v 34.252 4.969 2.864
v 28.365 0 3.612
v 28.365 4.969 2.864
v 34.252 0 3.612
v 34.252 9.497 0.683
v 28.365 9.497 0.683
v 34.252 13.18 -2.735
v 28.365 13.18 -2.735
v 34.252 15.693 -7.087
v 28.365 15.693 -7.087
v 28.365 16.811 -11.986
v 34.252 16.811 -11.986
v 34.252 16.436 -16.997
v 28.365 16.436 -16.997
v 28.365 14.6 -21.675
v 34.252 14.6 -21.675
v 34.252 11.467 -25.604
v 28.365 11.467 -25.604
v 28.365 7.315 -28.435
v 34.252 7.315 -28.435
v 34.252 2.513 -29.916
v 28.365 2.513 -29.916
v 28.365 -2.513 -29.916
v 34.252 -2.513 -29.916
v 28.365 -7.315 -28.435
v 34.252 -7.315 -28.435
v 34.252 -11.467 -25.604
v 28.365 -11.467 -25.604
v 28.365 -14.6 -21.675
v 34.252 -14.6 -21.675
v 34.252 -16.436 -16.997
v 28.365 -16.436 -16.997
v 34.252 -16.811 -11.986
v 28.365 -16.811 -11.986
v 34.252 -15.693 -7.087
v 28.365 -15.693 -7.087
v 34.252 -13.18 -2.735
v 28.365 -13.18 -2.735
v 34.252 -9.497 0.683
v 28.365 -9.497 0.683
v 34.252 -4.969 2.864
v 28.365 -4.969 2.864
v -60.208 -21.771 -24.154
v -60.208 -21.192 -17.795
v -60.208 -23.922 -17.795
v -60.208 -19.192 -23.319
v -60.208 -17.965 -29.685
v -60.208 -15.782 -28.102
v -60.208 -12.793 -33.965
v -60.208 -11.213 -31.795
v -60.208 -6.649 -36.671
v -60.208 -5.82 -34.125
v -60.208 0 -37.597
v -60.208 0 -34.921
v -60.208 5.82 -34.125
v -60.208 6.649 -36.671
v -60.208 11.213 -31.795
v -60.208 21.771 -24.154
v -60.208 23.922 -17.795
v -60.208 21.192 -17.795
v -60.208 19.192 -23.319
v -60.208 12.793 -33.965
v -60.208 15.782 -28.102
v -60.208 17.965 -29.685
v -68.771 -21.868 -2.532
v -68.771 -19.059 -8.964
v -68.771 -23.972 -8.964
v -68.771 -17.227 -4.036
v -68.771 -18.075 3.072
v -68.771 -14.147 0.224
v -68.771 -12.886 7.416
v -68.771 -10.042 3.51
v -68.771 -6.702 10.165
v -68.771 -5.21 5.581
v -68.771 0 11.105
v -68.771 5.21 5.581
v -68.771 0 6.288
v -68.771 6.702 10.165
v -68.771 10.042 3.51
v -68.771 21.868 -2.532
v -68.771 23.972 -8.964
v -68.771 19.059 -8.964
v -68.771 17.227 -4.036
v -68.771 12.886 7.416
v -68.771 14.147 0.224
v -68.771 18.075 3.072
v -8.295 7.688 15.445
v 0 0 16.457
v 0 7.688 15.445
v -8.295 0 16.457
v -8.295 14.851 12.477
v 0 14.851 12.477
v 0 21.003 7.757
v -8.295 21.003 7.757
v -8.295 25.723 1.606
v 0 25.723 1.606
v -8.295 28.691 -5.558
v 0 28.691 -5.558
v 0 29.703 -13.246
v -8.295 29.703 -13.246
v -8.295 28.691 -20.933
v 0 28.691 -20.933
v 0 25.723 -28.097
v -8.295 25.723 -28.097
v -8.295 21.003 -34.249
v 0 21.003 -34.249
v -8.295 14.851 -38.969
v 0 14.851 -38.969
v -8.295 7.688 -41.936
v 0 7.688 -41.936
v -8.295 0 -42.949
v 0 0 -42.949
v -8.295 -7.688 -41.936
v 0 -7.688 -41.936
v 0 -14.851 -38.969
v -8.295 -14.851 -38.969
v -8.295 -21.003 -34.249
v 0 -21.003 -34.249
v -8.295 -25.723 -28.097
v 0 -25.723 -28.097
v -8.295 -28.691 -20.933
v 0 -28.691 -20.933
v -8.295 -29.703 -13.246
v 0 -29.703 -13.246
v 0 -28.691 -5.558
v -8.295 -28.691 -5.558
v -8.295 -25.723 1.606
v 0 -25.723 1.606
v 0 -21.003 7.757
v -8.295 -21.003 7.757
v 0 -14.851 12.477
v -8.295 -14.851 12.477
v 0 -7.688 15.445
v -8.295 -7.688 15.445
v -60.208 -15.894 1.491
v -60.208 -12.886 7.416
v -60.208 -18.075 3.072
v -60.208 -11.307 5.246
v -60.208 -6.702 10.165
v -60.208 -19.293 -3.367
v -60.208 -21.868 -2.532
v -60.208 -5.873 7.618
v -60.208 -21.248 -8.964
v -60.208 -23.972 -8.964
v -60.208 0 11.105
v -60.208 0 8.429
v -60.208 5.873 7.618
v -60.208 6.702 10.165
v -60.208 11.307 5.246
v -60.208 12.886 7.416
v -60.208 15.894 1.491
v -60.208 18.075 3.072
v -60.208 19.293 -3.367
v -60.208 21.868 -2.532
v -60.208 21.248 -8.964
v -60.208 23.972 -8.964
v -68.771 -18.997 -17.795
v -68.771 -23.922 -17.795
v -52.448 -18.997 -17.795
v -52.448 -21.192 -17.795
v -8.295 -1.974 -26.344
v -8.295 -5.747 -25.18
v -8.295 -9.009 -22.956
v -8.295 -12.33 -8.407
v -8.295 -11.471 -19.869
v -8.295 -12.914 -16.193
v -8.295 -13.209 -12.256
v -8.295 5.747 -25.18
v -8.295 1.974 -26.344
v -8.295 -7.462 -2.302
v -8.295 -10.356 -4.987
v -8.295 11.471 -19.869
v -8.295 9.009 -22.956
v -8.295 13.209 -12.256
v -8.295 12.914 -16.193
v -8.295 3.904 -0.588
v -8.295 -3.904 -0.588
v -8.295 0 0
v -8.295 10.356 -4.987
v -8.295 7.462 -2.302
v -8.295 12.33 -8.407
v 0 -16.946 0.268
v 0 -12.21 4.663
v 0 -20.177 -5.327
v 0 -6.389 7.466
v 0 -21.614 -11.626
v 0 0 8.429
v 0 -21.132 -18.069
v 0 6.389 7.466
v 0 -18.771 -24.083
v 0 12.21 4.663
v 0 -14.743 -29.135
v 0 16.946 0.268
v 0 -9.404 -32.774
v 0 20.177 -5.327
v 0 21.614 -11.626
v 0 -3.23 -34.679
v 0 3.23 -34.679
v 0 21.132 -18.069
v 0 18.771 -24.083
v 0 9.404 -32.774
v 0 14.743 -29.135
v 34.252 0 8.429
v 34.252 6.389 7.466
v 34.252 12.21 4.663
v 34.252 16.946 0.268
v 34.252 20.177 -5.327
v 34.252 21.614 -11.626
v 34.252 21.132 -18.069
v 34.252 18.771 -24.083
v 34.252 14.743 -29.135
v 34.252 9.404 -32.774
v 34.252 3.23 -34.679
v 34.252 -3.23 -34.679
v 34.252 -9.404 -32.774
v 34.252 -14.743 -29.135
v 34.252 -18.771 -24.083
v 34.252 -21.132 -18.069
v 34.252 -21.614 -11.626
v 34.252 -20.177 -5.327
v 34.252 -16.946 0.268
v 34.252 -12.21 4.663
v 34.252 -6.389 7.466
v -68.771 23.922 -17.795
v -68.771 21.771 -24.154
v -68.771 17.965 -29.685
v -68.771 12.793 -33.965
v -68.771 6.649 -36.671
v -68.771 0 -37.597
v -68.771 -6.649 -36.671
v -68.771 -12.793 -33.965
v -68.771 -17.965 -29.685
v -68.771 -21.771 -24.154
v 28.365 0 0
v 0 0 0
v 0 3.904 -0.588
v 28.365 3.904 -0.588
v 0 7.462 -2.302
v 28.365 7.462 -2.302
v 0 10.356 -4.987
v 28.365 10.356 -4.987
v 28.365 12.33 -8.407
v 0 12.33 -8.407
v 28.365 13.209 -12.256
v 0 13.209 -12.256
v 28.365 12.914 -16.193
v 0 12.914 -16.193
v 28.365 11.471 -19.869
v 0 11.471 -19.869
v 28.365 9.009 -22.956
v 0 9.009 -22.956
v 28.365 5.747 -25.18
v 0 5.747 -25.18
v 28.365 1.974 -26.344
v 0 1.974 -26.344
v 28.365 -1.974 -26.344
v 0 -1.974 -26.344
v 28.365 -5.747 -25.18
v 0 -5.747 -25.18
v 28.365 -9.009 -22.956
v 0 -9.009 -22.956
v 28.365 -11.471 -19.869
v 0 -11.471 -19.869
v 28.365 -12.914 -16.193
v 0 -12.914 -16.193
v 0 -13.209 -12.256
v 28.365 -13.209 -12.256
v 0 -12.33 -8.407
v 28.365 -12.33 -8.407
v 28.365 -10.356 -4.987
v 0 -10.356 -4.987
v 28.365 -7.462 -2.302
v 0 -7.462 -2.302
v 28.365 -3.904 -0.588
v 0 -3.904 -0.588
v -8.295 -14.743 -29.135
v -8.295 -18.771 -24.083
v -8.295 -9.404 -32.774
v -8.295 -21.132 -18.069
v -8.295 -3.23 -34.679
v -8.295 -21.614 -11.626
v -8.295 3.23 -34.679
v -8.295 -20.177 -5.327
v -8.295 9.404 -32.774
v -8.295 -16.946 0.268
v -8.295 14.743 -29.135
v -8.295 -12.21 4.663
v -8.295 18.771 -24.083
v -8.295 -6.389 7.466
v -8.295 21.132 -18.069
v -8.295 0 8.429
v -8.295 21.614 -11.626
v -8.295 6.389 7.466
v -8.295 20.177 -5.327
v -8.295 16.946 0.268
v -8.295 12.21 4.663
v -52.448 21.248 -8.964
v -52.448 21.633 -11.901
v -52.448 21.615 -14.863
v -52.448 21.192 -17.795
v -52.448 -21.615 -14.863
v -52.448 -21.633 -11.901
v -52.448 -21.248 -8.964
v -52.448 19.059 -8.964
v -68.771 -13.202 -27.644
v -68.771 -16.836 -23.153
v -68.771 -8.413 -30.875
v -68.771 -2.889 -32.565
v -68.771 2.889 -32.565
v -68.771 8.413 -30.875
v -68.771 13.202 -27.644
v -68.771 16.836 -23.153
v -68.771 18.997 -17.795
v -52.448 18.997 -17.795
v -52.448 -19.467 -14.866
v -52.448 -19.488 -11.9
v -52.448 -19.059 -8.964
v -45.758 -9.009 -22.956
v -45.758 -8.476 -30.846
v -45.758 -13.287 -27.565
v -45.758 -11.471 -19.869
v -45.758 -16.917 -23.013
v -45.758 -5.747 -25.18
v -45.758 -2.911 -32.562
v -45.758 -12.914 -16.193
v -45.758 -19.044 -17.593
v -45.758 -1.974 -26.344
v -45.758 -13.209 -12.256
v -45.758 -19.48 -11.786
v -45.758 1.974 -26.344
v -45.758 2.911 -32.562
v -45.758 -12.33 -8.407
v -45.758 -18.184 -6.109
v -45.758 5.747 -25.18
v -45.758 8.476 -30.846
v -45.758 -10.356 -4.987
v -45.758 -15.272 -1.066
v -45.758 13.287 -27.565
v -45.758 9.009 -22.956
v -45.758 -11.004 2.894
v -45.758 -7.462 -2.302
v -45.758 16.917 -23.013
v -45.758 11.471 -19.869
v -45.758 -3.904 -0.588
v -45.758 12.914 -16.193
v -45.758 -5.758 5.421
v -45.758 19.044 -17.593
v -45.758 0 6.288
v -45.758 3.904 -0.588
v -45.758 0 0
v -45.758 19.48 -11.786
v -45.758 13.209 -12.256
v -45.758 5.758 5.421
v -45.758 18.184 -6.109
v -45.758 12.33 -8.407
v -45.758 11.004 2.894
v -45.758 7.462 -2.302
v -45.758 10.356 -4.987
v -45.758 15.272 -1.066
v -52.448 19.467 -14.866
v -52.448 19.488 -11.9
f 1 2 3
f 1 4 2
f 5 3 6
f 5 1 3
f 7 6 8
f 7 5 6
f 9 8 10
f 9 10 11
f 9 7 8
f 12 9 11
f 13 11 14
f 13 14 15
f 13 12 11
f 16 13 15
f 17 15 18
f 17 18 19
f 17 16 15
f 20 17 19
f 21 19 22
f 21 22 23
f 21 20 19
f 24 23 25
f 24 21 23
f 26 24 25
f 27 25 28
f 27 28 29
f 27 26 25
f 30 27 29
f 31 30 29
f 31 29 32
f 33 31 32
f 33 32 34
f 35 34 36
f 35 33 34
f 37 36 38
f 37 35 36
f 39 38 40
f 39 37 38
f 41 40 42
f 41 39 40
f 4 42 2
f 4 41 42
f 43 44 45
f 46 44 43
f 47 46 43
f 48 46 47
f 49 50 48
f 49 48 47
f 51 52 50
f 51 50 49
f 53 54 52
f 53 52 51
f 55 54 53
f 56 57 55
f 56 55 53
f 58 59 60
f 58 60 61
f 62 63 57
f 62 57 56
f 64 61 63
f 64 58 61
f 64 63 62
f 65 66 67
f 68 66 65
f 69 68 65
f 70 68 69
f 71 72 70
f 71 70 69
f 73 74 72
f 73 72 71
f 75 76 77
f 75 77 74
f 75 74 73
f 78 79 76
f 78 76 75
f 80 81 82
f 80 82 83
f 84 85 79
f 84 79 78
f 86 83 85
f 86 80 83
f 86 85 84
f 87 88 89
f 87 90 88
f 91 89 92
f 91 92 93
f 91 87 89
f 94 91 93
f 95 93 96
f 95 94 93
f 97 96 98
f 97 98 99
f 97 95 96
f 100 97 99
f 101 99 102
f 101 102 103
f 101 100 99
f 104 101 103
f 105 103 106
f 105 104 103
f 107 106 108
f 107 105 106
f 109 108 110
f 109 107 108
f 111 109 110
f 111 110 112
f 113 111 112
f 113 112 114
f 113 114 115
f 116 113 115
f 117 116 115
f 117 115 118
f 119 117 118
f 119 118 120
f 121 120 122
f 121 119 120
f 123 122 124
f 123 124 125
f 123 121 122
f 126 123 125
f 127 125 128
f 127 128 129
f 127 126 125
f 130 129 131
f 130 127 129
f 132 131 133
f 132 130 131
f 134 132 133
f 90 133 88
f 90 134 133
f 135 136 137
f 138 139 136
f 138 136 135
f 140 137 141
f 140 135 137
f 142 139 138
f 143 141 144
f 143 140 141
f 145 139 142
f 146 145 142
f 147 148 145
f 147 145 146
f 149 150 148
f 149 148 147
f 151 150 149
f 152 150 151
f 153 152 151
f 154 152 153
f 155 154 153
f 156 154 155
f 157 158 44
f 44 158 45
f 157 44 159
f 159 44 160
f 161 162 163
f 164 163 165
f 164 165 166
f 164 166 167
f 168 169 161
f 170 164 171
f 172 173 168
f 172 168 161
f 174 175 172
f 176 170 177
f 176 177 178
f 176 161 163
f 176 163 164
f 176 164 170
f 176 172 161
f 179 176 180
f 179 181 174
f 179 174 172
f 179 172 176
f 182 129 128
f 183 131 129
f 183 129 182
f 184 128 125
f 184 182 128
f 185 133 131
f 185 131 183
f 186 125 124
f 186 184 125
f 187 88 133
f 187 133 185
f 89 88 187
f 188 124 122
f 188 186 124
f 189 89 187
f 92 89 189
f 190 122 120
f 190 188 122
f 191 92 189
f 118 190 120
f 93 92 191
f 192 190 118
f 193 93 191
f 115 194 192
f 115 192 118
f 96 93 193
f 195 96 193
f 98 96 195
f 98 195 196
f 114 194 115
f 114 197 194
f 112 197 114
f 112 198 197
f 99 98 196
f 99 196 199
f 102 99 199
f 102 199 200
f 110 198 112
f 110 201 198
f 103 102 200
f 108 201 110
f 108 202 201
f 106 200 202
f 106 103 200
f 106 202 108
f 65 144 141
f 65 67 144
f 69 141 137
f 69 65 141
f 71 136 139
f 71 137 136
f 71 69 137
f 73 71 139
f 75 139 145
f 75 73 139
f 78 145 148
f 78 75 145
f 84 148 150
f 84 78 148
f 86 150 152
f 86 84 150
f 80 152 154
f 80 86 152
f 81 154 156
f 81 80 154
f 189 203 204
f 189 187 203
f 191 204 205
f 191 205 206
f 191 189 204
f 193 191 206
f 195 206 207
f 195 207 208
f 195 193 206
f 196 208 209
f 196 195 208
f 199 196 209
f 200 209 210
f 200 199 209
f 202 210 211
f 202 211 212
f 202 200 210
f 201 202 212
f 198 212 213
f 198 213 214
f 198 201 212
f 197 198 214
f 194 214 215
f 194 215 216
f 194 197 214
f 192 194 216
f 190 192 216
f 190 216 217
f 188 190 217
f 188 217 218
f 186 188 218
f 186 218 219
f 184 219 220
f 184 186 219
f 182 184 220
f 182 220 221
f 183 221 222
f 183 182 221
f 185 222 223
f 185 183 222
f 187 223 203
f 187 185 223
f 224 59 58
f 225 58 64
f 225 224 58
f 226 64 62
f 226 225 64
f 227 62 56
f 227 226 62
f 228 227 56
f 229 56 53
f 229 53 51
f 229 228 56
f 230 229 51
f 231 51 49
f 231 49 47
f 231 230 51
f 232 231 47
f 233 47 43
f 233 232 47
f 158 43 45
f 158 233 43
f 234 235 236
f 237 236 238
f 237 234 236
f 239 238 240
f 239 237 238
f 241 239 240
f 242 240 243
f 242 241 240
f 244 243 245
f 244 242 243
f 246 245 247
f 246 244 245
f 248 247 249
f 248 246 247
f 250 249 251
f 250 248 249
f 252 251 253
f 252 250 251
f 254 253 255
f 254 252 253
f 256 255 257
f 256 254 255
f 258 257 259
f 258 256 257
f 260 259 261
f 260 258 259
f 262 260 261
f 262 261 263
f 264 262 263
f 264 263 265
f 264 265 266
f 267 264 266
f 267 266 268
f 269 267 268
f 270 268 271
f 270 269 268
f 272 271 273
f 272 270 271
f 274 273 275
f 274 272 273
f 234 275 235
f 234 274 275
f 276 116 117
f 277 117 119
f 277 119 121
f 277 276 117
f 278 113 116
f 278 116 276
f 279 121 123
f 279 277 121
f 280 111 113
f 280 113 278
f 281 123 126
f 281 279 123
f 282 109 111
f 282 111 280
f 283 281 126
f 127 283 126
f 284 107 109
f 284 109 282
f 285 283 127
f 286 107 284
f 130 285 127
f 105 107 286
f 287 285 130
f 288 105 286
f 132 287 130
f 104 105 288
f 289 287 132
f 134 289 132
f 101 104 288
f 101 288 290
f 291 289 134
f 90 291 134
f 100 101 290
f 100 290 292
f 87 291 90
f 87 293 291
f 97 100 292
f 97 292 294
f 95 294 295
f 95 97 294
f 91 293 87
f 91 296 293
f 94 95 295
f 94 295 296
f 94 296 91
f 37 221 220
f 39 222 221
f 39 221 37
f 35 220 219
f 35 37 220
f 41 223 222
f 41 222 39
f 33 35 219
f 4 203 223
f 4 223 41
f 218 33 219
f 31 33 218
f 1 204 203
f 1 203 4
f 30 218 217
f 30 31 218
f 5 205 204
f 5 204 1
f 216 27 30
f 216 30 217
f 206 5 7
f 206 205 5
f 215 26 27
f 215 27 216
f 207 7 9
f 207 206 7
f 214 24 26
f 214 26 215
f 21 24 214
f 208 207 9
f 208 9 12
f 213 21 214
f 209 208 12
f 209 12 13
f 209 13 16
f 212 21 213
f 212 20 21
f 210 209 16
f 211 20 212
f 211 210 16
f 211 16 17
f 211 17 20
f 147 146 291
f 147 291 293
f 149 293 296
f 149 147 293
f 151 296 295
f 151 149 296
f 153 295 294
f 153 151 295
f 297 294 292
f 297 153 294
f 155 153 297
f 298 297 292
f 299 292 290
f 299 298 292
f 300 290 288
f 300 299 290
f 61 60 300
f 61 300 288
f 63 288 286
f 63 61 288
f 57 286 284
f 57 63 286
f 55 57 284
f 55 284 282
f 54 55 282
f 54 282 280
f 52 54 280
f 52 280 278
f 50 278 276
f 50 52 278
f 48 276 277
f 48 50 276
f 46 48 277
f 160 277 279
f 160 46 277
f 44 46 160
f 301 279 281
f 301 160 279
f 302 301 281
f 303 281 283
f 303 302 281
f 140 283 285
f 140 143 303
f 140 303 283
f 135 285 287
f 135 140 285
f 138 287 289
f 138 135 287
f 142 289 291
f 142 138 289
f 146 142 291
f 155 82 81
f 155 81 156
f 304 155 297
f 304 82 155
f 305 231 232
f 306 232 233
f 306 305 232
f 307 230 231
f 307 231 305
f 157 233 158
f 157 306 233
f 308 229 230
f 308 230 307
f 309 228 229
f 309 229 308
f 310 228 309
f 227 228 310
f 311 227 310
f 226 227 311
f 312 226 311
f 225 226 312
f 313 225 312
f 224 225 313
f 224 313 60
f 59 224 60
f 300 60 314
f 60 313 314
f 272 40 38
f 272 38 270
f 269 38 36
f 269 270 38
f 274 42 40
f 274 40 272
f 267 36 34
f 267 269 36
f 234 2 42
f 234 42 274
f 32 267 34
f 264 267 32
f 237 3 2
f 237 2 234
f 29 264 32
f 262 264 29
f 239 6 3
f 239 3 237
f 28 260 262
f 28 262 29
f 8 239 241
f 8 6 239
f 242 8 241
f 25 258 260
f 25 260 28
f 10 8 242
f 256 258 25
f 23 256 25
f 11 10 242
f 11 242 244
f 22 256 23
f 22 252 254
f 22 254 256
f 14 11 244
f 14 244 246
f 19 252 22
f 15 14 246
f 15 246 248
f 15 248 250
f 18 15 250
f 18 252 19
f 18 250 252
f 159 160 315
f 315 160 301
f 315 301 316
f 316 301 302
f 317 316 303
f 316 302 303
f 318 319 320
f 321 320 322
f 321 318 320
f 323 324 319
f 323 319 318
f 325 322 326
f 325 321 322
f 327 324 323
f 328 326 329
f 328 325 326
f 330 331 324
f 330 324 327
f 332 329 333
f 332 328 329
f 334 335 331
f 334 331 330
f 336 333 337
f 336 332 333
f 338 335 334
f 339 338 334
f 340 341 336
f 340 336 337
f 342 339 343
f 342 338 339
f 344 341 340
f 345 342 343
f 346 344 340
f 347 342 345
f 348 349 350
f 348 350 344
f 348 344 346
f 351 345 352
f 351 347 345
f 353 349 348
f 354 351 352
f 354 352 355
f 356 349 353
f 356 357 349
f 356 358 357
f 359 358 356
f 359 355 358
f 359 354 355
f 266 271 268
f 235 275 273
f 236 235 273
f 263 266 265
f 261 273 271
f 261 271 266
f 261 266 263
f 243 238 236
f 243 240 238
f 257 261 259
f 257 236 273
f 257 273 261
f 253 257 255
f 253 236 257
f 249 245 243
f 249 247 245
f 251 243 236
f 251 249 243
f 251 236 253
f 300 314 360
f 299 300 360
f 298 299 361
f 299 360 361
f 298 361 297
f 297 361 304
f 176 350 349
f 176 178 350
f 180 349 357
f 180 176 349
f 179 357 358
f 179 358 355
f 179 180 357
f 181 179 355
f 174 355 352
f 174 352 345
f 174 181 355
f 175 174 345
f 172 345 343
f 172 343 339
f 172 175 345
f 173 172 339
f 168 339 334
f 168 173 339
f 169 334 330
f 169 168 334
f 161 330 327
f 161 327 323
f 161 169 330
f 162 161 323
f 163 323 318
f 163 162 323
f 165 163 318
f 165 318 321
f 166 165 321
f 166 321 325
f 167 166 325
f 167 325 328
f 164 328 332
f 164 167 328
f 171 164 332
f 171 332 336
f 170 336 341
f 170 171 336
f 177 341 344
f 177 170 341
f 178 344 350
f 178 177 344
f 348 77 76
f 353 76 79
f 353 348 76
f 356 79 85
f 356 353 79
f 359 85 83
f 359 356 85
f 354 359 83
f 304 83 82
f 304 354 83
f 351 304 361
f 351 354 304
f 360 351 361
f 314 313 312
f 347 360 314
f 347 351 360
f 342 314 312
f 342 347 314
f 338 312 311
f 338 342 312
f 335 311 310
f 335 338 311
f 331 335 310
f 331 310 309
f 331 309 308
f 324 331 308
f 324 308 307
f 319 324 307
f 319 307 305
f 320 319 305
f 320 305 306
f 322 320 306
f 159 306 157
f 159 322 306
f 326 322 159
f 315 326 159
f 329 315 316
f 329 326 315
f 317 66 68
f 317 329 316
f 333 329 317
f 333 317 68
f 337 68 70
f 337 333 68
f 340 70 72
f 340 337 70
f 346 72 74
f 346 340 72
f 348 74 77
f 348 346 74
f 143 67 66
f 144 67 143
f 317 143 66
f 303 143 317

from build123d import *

# Parameters (mm, degrees)
F2_W     = 20.069398
F2_H     = 8.830535
F3_DEPTH = 6350


with BuildPart() as f1:
    # F0 (on Front) → F1 (revolve)
    with BuildSketch(Plane.XZ):
        Polygon((0, -13.245802), (0, 0), (28.36475, 0), (28.36475, 3.612492), (34.251776, 3.612492), (34.251776, 8.429147), (0, 8.429147), (0, 16.456908), (-8.295352, 16.456908), (-8.295352, 8.429147), (-60.208194, 8.429147), (-60.208194, 11.105067), (-68.771139, 11.105067), (-68.771139, 6.288412), (-45.758229, 6.288412), (-45.758229, 0), (-8.295352, 0), (-8.295352, -13.245802), align=None)
    revolve(axis=Axis((-4.147676, 0, -13.245802), (-1, 0, 0)))

    # F2 (on Front) → F3 (cut, symmetric)
    with BuildSketch(Plane.XZ):
        with Locations((-62.482726, -13.379599)):
            Rectangle(F2_W, F2_H)
    extrude(amount=F3_DEPTH, both=True, mode=Mode.SUBTRACT)


solid = f1.part
